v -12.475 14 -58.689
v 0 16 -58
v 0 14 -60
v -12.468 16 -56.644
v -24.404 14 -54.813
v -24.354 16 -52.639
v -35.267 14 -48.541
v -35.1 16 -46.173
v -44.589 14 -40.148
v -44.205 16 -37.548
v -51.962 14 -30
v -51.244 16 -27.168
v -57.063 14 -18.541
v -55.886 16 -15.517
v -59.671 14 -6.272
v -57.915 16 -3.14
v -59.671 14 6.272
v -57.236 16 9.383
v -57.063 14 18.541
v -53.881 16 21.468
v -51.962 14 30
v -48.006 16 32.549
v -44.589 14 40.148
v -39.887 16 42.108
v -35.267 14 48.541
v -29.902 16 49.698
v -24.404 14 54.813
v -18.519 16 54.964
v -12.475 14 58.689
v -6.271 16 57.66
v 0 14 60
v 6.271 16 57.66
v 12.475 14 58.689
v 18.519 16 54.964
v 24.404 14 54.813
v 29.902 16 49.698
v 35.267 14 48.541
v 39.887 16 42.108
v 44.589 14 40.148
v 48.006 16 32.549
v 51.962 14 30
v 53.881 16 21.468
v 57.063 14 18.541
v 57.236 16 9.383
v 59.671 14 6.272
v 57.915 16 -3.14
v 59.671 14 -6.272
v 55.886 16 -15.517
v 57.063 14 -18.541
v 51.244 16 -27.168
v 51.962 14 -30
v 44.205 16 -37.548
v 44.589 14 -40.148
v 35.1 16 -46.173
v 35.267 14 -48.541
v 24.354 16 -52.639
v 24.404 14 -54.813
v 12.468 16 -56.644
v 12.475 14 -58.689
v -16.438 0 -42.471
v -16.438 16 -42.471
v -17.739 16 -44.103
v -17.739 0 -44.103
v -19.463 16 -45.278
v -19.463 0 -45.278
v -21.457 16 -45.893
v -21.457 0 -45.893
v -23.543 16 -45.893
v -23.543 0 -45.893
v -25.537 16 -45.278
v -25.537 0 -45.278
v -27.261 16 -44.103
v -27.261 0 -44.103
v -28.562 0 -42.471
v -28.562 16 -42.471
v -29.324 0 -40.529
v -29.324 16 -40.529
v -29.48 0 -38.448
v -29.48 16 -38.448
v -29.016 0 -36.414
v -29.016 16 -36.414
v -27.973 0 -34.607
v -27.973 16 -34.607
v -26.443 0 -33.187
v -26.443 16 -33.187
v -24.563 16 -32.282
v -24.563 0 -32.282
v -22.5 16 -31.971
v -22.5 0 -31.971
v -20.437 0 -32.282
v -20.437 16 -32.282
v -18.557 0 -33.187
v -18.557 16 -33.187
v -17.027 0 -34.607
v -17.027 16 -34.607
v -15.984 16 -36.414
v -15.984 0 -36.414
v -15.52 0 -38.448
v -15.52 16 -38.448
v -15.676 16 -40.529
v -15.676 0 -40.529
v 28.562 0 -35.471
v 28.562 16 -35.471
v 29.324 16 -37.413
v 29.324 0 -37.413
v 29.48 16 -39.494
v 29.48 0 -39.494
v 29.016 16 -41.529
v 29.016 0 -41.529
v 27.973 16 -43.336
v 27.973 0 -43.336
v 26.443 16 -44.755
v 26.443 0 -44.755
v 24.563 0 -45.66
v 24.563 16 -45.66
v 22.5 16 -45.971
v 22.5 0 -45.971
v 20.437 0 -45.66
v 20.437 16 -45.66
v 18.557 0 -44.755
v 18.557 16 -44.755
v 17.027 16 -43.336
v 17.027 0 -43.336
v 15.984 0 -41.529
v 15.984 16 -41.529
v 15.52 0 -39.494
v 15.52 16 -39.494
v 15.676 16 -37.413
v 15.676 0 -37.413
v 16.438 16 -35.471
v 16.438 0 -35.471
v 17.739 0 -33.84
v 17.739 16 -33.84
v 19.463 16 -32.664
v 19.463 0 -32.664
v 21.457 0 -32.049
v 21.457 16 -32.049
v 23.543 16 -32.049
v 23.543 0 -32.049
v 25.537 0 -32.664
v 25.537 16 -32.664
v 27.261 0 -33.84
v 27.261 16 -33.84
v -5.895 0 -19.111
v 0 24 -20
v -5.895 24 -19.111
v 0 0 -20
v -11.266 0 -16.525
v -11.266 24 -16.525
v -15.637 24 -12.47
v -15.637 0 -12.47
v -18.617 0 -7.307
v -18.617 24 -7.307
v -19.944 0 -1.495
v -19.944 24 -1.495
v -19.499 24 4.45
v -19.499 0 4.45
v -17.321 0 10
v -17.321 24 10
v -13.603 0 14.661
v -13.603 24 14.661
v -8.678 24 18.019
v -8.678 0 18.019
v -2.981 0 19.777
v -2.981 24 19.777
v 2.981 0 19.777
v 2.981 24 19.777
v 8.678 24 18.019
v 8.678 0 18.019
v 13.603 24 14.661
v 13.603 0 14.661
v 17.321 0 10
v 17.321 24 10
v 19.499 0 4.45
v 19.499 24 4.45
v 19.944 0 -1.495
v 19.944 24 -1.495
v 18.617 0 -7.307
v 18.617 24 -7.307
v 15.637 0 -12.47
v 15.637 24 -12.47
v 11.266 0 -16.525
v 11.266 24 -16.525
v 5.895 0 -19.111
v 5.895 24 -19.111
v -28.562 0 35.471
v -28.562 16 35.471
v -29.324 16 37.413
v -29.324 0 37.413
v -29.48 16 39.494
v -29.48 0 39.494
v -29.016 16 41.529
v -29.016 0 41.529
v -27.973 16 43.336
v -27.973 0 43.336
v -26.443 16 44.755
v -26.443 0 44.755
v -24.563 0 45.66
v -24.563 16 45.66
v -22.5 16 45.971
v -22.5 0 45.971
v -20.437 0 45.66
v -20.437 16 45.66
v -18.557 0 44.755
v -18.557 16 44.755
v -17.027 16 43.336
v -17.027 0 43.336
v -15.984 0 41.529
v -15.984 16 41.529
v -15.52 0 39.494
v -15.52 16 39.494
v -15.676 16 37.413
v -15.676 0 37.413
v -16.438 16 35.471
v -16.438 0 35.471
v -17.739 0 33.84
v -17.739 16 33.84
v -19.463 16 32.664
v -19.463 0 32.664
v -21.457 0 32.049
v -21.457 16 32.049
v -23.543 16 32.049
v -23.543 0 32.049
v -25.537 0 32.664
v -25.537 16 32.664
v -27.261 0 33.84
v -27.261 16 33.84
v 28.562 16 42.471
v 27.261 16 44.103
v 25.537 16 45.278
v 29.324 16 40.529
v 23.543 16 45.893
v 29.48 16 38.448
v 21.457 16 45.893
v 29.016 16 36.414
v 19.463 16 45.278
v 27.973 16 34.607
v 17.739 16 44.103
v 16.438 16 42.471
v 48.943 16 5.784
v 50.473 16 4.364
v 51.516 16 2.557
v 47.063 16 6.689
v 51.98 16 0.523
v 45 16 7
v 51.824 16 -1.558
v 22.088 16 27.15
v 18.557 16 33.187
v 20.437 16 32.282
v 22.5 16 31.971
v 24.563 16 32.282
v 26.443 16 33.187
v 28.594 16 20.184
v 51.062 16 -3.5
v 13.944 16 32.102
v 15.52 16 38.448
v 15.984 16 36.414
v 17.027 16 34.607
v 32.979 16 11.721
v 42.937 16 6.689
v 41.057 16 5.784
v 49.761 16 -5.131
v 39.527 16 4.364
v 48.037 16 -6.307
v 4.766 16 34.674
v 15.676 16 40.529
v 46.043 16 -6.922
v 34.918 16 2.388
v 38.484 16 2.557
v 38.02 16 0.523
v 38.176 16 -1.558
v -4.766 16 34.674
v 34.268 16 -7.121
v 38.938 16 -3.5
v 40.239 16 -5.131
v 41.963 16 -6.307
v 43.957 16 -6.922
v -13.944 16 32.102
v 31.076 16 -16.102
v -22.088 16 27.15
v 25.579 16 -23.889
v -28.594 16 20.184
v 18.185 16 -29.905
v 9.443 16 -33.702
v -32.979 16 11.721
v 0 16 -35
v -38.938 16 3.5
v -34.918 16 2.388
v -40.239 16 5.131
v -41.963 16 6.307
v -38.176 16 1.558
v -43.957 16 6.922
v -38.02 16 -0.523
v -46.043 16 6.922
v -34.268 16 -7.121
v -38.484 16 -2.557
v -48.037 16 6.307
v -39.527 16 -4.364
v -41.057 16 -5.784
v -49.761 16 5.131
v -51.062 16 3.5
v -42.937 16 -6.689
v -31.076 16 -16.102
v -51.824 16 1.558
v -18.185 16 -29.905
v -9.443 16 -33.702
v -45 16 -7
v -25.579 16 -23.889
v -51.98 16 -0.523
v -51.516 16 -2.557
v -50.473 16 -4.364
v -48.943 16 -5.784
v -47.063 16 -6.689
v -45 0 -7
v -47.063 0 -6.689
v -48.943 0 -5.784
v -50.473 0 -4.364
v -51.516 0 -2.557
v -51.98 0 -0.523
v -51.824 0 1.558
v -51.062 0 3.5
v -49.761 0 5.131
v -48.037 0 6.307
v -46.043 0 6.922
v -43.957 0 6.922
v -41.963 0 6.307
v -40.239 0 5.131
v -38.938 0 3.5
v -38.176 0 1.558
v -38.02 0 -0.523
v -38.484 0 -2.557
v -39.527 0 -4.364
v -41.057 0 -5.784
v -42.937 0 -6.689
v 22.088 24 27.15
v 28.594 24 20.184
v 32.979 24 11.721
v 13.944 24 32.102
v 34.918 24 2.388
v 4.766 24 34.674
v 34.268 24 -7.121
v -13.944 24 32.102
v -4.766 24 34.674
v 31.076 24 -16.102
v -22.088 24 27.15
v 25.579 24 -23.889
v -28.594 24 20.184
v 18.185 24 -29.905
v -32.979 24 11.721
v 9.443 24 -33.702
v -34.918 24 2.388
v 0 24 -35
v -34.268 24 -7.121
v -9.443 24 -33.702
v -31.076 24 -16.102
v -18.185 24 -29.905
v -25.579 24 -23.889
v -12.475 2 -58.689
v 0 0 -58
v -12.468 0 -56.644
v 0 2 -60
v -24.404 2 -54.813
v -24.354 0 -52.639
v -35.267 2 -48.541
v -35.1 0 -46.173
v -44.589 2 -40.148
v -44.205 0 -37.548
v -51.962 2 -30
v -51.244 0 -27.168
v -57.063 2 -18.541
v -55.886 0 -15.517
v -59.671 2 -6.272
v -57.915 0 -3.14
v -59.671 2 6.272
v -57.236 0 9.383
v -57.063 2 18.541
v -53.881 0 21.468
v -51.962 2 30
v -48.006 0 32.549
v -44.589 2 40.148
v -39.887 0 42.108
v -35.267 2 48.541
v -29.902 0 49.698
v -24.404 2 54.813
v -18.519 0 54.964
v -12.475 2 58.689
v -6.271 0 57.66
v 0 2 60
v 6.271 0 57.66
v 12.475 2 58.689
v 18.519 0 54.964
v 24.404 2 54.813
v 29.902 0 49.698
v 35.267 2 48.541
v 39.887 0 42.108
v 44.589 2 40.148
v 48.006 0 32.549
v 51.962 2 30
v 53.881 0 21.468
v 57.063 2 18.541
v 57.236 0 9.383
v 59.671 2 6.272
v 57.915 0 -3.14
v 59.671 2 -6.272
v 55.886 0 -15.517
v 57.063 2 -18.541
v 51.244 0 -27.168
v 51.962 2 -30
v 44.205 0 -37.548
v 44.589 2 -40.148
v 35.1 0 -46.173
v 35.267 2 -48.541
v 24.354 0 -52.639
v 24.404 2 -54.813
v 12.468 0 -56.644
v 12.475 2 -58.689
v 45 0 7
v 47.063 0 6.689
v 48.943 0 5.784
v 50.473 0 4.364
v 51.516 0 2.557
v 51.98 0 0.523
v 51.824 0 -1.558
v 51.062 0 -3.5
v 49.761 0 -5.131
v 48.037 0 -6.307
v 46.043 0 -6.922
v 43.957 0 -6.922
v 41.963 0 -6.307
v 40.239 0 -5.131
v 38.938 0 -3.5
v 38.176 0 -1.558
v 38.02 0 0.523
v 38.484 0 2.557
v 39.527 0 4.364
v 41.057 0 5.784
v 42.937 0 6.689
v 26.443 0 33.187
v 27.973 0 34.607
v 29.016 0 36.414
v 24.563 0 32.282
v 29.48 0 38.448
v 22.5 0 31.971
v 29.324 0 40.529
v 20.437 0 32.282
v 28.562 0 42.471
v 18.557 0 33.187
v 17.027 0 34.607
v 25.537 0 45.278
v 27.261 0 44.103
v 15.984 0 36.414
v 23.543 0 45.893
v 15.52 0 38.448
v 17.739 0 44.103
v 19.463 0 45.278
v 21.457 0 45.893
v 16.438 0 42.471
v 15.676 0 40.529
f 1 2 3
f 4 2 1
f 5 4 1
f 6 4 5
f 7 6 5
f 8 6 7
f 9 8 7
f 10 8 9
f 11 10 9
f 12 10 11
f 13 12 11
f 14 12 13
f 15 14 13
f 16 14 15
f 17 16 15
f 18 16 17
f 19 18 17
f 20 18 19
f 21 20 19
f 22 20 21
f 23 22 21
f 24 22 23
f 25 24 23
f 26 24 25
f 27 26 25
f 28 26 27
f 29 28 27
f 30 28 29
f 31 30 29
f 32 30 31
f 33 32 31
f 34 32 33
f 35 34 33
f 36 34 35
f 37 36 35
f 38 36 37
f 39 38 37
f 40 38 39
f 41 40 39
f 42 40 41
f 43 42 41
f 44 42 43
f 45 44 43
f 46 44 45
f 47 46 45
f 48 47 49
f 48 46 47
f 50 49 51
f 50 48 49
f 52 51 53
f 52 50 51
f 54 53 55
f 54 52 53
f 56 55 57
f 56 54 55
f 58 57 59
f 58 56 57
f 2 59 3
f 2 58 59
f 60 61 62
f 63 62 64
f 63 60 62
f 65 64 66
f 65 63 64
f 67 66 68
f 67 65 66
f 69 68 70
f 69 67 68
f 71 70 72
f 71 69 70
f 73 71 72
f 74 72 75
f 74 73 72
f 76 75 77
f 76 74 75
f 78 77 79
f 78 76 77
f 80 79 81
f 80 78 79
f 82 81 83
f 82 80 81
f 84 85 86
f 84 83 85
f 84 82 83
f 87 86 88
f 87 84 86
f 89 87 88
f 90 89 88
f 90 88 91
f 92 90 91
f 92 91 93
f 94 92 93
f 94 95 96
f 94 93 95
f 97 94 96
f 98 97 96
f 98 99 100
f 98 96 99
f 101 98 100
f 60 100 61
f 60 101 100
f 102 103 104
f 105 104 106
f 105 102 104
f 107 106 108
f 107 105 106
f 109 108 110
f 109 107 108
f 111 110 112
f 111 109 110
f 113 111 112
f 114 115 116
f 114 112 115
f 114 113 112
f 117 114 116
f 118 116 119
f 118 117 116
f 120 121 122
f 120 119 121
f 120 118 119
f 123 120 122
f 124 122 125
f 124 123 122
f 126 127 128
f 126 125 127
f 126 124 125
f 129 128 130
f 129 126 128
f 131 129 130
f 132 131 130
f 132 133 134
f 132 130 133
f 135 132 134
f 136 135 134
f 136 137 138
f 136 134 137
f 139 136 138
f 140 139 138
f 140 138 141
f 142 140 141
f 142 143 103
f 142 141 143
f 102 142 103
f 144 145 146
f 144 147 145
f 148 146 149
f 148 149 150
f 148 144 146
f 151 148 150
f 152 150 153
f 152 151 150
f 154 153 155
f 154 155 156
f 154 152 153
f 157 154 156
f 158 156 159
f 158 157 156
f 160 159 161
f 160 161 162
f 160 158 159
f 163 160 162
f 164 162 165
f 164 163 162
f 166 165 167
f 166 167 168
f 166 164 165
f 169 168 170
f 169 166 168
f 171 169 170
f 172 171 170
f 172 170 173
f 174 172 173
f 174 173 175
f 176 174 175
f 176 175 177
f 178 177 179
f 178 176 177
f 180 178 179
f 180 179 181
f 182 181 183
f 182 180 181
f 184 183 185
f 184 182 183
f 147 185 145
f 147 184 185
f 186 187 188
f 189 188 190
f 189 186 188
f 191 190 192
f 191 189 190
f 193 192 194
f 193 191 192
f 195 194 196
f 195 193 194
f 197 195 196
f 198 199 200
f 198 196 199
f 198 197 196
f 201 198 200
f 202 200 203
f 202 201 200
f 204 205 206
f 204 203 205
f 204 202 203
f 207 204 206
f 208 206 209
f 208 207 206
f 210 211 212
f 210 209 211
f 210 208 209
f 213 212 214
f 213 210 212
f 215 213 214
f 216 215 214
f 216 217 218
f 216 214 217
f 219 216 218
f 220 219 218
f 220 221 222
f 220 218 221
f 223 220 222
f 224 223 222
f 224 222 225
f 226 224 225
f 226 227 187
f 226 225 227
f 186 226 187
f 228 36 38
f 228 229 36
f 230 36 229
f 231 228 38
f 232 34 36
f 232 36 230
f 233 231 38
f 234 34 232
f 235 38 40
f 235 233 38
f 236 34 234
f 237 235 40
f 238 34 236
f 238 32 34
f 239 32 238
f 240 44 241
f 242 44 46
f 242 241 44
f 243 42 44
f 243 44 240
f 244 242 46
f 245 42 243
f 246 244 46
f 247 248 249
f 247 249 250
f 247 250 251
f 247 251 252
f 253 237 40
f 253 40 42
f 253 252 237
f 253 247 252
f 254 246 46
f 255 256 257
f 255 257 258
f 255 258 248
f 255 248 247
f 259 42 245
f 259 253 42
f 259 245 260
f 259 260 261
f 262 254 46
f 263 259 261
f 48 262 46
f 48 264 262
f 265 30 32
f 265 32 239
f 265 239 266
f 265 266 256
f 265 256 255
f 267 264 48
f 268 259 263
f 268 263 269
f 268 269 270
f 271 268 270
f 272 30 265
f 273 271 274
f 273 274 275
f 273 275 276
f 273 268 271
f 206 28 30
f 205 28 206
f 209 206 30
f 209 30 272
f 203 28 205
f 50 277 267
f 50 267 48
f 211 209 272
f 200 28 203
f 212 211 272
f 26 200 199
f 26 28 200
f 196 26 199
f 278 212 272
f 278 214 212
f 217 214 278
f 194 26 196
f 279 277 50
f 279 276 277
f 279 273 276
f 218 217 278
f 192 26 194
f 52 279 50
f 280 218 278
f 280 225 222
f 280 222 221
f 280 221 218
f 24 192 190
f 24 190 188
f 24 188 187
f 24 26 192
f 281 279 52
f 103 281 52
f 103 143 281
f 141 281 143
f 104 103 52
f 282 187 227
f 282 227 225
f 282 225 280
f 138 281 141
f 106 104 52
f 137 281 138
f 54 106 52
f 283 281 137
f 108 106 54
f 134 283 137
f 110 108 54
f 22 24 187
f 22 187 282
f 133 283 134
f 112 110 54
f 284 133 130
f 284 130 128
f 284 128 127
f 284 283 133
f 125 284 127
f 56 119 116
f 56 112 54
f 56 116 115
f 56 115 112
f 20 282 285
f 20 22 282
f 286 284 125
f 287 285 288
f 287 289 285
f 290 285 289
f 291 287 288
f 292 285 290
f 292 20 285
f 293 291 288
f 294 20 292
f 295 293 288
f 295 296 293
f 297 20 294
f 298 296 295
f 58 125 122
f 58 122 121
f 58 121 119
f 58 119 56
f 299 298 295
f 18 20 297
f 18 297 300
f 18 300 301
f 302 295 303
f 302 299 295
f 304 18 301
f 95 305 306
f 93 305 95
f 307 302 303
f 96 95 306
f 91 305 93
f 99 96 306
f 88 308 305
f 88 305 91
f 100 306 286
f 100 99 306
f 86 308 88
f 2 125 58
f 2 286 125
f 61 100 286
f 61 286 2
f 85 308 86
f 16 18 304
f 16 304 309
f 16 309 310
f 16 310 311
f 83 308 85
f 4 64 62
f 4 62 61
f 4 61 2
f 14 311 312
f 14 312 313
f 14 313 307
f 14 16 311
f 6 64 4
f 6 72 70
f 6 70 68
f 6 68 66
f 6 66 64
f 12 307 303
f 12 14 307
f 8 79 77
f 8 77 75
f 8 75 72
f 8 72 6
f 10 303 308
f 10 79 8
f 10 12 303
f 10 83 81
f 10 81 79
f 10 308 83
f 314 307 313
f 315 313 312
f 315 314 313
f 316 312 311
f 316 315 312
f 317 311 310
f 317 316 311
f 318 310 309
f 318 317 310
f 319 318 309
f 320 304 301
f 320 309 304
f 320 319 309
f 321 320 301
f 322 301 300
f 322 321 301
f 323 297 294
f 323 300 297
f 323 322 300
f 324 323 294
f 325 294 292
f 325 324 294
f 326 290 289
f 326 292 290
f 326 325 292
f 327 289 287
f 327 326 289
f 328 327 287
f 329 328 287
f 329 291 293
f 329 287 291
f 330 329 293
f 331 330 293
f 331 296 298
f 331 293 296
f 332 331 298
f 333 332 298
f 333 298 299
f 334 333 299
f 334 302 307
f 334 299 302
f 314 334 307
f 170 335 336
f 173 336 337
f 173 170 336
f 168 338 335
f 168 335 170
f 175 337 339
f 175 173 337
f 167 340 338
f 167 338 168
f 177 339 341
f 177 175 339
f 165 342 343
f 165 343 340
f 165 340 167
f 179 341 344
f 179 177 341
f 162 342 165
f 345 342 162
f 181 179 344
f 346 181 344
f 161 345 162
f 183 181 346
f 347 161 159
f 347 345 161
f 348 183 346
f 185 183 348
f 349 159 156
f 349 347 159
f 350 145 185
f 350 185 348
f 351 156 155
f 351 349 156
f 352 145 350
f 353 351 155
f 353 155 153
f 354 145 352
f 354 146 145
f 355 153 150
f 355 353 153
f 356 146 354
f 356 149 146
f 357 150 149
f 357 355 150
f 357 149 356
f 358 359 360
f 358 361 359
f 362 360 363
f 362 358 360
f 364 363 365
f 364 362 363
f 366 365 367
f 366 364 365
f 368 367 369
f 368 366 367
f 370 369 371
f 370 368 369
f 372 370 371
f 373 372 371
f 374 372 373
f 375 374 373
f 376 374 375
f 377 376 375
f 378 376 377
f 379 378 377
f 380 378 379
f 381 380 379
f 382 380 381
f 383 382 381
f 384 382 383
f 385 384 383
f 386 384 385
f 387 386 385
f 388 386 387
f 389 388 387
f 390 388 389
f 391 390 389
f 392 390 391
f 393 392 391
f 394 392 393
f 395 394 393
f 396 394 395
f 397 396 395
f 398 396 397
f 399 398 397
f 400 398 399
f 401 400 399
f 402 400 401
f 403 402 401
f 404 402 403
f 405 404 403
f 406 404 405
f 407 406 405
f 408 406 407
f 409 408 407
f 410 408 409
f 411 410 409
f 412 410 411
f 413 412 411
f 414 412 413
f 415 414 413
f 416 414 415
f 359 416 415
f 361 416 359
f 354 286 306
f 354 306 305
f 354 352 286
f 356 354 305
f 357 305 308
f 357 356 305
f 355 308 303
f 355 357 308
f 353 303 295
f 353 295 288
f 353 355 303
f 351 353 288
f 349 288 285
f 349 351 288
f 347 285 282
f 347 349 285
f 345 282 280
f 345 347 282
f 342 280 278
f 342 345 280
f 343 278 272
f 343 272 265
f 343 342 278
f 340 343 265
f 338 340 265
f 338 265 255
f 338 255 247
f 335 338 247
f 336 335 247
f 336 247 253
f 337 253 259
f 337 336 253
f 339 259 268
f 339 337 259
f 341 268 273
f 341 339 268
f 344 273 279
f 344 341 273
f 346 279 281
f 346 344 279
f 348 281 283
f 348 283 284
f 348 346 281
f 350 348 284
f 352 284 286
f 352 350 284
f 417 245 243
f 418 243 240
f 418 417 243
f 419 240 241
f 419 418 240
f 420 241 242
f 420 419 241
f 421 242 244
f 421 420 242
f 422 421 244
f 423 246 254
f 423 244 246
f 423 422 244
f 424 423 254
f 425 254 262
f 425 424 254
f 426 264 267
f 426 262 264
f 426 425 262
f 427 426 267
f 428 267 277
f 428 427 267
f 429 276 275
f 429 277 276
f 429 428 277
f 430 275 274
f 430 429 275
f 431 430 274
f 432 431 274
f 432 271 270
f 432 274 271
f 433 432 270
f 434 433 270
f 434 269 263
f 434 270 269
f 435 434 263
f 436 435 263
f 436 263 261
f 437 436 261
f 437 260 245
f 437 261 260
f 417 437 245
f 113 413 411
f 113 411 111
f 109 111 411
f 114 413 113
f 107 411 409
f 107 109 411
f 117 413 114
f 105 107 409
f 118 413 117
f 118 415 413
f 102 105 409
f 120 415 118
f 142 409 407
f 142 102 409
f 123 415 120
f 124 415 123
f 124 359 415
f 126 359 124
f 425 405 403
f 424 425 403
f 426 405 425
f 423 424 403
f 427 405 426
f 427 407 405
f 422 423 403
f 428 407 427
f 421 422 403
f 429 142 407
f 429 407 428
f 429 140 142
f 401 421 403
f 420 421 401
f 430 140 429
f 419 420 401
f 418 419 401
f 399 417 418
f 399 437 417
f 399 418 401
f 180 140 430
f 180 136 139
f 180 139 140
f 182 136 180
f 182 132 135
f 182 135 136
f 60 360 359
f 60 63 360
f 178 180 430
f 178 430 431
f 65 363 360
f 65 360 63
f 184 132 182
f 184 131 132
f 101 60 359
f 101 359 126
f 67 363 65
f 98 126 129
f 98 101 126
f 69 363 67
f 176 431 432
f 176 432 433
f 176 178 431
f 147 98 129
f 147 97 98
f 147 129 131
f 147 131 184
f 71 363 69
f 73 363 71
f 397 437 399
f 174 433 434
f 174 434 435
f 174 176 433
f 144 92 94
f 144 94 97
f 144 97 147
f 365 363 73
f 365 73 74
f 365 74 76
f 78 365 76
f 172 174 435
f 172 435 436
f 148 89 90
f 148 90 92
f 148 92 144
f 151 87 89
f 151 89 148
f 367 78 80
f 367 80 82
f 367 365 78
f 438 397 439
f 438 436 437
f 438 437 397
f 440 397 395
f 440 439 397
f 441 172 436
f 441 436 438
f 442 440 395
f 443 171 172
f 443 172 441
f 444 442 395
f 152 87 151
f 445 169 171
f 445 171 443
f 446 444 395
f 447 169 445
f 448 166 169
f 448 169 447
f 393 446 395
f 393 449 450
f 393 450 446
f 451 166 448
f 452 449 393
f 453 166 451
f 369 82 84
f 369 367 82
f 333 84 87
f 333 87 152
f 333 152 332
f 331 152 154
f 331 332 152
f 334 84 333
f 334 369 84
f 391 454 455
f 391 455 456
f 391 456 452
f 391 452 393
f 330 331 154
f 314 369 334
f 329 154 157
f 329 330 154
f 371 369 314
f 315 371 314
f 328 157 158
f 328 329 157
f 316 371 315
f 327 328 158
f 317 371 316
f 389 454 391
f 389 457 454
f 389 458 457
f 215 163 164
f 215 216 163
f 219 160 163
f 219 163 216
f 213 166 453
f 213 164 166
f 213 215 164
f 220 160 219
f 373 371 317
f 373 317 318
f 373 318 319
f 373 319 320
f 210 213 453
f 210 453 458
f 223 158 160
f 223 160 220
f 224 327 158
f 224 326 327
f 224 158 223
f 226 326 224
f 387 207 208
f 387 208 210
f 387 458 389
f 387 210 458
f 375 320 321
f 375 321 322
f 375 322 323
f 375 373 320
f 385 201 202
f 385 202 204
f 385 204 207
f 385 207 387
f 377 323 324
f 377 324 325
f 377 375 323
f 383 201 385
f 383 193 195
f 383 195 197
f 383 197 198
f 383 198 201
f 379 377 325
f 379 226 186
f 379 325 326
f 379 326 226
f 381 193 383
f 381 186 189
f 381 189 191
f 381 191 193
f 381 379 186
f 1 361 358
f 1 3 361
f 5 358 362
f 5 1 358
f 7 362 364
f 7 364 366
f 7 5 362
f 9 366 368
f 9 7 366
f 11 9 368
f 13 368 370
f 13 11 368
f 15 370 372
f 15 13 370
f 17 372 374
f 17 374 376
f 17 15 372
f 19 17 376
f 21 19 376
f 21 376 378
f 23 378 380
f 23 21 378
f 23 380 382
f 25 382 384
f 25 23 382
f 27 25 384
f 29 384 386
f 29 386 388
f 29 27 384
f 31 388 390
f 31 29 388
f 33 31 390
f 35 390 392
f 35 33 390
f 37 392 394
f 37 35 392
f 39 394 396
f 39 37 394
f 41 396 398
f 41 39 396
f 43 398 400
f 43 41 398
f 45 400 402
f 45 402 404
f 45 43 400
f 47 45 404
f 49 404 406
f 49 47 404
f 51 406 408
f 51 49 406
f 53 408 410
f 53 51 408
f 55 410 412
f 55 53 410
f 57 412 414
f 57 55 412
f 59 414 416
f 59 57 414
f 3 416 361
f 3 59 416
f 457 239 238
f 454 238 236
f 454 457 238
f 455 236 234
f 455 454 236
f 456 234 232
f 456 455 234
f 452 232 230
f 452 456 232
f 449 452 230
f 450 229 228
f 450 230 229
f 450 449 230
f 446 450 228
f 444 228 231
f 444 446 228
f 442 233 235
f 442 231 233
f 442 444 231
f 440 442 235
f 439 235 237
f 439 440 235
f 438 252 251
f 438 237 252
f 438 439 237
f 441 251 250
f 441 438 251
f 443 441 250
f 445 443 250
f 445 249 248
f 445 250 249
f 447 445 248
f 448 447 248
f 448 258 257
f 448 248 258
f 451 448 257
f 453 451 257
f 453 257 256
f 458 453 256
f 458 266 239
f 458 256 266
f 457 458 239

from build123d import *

# Parameters (mm, degrees)
SKETCH_2_R               = 7
CUT_EXTRUDE_1_DEPTH      = 89.18163074
PATTERN_CIRCULAR_1_COUNT = 6


with BuildPart() as part:
    # 草图1 → 旋转1 (revolve)
    with BuildSketch(Plane.XY, mode=Mode.PRIVATE) as revolve_1_sk:
        Polygon((20, 0), (58, 0), (60, 2), (60, 14), (58, 16), (35, 16), (35, 24), (20, 24), align=None)
    revolve(revolve_1_sk.sketch.rotate(Axis((0, -10, 0), (0, 1, 0)), 90), axis=Axis((0, -10, 0), (0, 1, 0)))

    # 草图2 → 切除-拉伸1 (cut, through all)
    with BuildSketch(Plane(origin=(0, 0, 0), x_dir=(1, 0, 0), z_dir=(0, 1, 0))):
        with Locations(Location((45, 0, 0), (0, 0, 270))):
            Circle(SKETCH_2_R)
    cut_extrude_1 = extrude(amount=CUT_EXTRUDE_1_DEPTH, mode=Mode.SUBTRACT)

    # 阵列(圆周)1: 切除-拉伸1 ×6 about axis
    pattern_circular_1_axis = Axis((0, 0, 0), (0, 1, 0))
    for i in range(1, PATTERN_CIRCULAR_1_COUNT):
        add(cut_extrude_1.rotate(pattern_circular_1_axis, i * 360 / PATTERN_CIRCULAR_1_COUNT), mode=Mode.SUBTRACT)


solid = part.part
